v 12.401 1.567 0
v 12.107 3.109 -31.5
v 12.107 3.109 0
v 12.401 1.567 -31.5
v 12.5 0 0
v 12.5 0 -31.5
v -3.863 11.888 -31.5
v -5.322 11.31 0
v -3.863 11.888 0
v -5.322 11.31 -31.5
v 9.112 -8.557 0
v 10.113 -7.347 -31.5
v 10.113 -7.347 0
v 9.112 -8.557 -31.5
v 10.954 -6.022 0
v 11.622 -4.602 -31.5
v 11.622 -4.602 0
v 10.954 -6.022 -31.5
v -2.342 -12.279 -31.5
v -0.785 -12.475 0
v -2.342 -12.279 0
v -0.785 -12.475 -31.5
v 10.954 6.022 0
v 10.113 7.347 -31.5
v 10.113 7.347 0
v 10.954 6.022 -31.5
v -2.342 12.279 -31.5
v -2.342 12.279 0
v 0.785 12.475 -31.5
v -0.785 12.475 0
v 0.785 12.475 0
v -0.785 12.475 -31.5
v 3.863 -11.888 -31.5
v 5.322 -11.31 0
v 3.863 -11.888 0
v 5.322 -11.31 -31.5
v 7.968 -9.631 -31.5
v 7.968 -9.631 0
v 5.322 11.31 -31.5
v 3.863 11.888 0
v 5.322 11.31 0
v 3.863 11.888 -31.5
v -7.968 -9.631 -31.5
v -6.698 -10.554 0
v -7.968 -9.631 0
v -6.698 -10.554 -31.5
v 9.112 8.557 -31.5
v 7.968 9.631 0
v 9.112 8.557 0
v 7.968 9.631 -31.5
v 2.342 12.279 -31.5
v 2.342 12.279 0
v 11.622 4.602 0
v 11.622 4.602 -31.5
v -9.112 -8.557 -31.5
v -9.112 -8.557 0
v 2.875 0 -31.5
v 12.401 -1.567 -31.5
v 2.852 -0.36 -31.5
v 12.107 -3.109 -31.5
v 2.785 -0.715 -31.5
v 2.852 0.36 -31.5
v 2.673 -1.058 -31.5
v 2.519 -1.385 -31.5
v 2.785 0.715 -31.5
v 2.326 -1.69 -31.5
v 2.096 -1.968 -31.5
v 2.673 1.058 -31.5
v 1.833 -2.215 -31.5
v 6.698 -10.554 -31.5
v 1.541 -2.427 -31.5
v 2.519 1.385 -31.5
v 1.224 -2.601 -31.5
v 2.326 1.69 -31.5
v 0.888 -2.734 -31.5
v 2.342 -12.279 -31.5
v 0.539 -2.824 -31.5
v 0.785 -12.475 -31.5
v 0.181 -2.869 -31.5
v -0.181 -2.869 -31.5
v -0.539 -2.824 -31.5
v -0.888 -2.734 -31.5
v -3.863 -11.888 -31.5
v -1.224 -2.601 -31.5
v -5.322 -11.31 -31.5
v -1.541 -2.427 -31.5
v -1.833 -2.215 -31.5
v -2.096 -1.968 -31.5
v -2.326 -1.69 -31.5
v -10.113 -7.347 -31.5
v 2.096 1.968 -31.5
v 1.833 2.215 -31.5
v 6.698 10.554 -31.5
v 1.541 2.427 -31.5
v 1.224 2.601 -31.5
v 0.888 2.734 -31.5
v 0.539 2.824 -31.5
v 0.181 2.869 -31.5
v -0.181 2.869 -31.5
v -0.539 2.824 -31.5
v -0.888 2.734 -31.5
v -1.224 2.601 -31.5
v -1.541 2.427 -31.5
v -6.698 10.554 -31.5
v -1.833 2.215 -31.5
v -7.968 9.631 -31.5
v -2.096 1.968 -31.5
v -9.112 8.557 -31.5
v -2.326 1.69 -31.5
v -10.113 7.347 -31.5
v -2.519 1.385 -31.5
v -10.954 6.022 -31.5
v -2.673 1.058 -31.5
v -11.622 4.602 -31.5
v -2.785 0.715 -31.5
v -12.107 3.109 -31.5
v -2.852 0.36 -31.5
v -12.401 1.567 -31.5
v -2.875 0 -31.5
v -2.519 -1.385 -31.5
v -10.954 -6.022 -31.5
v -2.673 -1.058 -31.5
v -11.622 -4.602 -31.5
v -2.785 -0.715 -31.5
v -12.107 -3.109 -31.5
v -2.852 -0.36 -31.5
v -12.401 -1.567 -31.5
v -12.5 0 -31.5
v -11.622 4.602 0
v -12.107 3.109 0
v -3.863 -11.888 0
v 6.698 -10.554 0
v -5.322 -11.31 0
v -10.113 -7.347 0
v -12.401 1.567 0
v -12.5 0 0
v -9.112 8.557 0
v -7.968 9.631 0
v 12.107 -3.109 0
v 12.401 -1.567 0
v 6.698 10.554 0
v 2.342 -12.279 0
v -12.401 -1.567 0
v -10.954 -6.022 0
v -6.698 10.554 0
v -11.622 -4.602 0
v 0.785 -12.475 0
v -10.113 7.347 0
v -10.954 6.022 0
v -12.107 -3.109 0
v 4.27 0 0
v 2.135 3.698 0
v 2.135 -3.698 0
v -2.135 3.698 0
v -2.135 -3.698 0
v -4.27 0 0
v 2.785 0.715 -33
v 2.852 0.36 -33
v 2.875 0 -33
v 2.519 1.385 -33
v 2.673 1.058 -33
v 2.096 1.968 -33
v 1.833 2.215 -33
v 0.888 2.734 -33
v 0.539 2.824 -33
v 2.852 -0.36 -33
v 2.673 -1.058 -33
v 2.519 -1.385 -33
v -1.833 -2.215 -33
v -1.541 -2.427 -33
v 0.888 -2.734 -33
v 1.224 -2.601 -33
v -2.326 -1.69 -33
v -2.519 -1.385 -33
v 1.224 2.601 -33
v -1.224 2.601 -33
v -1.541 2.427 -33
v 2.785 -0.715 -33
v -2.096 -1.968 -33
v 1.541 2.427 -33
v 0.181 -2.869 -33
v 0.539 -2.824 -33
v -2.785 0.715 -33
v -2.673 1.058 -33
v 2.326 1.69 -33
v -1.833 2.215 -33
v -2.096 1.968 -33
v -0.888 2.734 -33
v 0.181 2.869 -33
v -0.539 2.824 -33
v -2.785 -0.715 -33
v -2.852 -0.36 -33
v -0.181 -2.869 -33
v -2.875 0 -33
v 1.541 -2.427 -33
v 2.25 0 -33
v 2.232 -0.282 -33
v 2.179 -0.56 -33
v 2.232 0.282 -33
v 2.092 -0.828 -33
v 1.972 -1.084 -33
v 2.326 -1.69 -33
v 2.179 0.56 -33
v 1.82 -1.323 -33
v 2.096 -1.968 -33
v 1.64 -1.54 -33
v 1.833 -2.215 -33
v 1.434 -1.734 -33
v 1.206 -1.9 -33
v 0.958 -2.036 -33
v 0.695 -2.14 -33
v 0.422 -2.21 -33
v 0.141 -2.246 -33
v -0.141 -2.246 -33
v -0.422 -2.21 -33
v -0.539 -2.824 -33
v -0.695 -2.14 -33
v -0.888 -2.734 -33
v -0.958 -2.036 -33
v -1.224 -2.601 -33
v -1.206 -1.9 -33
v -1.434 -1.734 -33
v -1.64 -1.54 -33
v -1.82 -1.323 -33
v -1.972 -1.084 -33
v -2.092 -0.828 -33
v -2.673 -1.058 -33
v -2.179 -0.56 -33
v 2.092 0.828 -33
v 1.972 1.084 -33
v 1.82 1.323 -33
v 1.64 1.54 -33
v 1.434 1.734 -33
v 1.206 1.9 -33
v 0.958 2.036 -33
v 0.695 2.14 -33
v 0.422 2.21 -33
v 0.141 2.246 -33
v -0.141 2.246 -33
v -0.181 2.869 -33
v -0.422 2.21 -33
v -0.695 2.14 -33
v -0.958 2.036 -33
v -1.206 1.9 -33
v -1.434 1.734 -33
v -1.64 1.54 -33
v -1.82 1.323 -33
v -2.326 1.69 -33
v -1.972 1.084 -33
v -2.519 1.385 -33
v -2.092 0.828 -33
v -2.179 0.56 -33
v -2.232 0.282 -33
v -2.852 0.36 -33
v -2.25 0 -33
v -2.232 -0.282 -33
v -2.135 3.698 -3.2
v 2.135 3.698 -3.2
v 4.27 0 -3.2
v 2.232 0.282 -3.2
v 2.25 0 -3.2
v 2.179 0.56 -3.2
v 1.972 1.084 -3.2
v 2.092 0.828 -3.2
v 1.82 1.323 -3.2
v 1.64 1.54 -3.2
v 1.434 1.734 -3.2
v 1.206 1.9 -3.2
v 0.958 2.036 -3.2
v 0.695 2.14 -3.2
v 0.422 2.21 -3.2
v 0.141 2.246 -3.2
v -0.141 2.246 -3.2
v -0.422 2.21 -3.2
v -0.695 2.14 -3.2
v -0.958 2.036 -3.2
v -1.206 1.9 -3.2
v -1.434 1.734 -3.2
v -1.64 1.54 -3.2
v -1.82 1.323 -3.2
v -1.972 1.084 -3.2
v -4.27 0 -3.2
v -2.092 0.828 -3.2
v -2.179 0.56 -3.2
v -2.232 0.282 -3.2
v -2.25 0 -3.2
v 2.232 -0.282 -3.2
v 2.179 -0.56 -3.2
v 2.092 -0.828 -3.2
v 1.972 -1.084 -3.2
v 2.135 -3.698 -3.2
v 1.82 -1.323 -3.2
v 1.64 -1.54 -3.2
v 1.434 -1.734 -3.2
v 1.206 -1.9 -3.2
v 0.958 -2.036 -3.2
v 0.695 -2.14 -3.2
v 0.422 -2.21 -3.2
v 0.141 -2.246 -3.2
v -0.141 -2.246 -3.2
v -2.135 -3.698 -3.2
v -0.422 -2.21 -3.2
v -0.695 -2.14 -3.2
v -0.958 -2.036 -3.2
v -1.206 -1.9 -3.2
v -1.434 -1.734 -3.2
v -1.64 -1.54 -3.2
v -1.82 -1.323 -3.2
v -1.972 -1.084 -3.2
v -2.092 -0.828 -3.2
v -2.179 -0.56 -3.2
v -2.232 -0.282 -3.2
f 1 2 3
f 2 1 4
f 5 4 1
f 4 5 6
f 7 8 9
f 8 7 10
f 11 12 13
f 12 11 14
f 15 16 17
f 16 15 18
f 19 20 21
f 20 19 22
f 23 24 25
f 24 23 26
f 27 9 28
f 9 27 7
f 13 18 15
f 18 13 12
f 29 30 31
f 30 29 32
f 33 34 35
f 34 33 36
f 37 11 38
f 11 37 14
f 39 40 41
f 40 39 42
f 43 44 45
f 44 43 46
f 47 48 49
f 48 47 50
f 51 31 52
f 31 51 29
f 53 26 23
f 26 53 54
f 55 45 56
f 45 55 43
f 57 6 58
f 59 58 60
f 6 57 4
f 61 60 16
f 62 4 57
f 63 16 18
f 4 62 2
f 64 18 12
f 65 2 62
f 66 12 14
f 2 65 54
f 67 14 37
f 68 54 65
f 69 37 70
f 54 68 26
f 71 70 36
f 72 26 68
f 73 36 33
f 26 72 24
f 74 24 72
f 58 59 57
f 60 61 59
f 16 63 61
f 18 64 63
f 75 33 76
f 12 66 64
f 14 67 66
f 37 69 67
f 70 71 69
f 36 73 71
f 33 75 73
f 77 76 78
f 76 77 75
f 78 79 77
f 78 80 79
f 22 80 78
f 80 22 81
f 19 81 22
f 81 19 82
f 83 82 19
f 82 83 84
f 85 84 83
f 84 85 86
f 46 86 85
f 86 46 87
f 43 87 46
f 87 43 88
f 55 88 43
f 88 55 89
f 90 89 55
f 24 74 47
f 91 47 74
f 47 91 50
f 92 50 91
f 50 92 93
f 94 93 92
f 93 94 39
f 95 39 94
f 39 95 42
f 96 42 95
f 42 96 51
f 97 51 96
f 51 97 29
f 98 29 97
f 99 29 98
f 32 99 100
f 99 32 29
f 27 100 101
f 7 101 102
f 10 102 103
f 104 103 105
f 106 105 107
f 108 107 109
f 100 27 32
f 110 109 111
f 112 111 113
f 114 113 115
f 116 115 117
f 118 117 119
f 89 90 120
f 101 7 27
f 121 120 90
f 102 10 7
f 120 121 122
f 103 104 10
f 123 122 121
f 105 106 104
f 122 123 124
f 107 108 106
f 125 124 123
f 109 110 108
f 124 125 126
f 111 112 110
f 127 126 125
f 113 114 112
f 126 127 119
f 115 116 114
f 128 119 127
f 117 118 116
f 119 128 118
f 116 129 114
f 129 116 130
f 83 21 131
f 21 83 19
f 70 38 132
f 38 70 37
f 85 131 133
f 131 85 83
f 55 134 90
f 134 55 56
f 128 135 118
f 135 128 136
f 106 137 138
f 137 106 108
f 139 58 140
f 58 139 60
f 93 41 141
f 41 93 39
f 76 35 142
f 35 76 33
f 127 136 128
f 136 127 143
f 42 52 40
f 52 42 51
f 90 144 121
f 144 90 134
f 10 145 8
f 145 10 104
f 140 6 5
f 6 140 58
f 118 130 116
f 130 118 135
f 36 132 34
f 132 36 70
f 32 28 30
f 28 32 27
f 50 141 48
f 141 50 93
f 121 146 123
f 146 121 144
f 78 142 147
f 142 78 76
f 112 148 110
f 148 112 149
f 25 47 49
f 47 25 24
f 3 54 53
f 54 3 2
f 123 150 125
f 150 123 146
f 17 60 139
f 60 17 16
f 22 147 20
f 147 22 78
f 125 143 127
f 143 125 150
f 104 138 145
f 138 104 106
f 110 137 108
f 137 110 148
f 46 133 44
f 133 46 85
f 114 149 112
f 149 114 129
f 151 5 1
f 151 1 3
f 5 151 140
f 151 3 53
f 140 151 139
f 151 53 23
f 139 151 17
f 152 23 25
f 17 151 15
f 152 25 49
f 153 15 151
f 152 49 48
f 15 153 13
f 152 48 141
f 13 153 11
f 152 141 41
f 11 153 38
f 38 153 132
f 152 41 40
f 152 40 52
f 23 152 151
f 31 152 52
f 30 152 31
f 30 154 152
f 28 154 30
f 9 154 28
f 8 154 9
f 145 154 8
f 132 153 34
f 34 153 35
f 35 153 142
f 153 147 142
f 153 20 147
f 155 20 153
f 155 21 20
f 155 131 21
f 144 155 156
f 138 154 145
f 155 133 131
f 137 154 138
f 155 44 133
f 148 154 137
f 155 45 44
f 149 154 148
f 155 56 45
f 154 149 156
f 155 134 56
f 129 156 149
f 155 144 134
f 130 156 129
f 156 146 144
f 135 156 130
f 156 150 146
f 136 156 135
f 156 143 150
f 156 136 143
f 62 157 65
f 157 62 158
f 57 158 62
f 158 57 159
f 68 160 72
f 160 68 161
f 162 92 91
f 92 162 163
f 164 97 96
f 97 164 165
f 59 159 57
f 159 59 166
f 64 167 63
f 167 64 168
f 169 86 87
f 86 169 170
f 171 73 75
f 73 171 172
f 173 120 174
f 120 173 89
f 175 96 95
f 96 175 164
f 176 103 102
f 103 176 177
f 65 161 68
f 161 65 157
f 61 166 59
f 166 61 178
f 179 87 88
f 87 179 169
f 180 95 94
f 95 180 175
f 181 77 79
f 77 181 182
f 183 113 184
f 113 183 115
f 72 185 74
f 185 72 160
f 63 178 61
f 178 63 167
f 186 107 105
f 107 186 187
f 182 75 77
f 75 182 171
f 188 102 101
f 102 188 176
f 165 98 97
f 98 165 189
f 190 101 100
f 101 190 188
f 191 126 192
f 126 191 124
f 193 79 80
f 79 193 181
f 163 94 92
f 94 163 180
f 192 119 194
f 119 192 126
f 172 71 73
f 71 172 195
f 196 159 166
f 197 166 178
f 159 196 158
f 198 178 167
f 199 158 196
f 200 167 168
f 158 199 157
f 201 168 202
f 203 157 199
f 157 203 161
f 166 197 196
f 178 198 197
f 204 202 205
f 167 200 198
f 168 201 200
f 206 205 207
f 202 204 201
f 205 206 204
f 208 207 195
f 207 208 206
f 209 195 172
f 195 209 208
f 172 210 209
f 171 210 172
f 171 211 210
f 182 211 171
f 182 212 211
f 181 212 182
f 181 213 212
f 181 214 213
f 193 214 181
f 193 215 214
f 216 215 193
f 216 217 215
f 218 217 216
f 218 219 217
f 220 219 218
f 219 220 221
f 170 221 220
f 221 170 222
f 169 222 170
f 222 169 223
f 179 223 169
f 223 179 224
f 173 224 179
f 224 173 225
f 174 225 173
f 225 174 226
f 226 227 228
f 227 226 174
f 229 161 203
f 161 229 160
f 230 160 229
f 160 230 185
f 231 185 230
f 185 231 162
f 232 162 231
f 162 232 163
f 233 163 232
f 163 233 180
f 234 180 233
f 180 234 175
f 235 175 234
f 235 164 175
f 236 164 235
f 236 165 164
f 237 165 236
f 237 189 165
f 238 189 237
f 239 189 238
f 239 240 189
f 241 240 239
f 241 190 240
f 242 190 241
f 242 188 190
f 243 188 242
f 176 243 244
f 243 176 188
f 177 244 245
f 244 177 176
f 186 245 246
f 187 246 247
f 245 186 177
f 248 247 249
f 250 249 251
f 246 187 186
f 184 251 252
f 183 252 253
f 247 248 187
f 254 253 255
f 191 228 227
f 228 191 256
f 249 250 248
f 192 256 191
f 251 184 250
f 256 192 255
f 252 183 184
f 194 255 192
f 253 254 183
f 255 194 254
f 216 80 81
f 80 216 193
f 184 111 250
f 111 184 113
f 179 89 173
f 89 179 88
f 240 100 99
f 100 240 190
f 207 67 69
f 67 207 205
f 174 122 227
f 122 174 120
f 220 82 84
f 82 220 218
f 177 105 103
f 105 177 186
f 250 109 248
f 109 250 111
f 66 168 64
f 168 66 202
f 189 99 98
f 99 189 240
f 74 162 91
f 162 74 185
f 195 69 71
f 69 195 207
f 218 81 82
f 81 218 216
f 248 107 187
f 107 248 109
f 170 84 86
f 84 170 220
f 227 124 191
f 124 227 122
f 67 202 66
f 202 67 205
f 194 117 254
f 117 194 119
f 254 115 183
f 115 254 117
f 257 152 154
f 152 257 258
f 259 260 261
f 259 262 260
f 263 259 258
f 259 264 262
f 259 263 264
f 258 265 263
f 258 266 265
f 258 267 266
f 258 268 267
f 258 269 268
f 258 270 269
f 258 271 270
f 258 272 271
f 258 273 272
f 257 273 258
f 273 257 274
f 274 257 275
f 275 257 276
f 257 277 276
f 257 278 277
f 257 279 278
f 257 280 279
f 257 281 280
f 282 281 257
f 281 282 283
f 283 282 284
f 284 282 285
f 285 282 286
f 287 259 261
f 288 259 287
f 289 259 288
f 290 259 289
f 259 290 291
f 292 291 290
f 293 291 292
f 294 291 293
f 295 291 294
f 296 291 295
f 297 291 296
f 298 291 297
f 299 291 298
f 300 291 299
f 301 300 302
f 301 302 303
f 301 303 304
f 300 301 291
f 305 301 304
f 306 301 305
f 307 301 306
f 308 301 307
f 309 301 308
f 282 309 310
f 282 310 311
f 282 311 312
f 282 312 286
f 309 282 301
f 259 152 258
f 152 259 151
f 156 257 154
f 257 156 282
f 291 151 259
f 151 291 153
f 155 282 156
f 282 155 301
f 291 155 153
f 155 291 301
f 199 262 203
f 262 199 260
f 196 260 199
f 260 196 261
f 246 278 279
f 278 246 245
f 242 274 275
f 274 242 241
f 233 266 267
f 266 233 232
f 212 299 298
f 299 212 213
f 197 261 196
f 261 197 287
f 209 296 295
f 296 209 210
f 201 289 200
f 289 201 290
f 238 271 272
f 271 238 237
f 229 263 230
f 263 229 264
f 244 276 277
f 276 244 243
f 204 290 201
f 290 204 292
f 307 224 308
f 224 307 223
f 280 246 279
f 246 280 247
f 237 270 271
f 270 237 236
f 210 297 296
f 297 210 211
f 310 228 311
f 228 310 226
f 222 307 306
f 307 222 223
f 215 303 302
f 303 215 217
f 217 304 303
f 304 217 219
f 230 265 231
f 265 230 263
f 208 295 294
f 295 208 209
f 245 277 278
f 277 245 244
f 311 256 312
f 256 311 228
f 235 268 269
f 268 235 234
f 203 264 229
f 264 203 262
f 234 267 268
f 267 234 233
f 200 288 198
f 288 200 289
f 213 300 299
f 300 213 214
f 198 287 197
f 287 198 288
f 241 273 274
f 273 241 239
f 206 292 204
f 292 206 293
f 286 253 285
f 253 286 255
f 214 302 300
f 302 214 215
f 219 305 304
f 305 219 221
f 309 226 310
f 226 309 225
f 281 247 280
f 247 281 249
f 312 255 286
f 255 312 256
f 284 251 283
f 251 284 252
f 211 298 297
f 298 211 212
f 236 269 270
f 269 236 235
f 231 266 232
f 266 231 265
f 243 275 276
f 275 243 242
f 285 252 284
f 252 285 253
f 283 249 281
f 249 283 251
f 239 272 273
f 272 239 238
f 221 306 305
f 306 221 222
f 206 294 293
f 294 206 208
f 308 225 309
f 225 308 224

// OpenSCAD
$fn = 50;

difference() {
	union() {
		translate(v = [0, 0, -31.5]) {
			cylinder(h = 31.5, r = 12.5);
		}
		#translate(v = [0, 0, -33.0]) {
			cylinder(h = 33, r = 2.875);
		}
	}
	union() {
		translate(v = [0, 0, 0]) {
			rotate(a = [0, 0, 0]) {
				difference() {
					union() {
						translate(v = [0, 0, -3.2]) {
							linear_extrude(height = 3.2) {
								polygon(points = [[4.2698, 0.0], [2.1349000000000005, 3.697755269078796], [-2.134899999999999, 3.6977552690787965], [-4.2698, 5.228996902999369e-16], [-2.134900000000002, -3.6977552690787956], [2.1348999999999974, -3.697755269078798]]);
							}
						}
					}
					union();
				}
			}
		}
		#translate(v = [0, 0, -100.0]) {
			cylinder(h = 200, r = 2.25);
		}
	}
}
